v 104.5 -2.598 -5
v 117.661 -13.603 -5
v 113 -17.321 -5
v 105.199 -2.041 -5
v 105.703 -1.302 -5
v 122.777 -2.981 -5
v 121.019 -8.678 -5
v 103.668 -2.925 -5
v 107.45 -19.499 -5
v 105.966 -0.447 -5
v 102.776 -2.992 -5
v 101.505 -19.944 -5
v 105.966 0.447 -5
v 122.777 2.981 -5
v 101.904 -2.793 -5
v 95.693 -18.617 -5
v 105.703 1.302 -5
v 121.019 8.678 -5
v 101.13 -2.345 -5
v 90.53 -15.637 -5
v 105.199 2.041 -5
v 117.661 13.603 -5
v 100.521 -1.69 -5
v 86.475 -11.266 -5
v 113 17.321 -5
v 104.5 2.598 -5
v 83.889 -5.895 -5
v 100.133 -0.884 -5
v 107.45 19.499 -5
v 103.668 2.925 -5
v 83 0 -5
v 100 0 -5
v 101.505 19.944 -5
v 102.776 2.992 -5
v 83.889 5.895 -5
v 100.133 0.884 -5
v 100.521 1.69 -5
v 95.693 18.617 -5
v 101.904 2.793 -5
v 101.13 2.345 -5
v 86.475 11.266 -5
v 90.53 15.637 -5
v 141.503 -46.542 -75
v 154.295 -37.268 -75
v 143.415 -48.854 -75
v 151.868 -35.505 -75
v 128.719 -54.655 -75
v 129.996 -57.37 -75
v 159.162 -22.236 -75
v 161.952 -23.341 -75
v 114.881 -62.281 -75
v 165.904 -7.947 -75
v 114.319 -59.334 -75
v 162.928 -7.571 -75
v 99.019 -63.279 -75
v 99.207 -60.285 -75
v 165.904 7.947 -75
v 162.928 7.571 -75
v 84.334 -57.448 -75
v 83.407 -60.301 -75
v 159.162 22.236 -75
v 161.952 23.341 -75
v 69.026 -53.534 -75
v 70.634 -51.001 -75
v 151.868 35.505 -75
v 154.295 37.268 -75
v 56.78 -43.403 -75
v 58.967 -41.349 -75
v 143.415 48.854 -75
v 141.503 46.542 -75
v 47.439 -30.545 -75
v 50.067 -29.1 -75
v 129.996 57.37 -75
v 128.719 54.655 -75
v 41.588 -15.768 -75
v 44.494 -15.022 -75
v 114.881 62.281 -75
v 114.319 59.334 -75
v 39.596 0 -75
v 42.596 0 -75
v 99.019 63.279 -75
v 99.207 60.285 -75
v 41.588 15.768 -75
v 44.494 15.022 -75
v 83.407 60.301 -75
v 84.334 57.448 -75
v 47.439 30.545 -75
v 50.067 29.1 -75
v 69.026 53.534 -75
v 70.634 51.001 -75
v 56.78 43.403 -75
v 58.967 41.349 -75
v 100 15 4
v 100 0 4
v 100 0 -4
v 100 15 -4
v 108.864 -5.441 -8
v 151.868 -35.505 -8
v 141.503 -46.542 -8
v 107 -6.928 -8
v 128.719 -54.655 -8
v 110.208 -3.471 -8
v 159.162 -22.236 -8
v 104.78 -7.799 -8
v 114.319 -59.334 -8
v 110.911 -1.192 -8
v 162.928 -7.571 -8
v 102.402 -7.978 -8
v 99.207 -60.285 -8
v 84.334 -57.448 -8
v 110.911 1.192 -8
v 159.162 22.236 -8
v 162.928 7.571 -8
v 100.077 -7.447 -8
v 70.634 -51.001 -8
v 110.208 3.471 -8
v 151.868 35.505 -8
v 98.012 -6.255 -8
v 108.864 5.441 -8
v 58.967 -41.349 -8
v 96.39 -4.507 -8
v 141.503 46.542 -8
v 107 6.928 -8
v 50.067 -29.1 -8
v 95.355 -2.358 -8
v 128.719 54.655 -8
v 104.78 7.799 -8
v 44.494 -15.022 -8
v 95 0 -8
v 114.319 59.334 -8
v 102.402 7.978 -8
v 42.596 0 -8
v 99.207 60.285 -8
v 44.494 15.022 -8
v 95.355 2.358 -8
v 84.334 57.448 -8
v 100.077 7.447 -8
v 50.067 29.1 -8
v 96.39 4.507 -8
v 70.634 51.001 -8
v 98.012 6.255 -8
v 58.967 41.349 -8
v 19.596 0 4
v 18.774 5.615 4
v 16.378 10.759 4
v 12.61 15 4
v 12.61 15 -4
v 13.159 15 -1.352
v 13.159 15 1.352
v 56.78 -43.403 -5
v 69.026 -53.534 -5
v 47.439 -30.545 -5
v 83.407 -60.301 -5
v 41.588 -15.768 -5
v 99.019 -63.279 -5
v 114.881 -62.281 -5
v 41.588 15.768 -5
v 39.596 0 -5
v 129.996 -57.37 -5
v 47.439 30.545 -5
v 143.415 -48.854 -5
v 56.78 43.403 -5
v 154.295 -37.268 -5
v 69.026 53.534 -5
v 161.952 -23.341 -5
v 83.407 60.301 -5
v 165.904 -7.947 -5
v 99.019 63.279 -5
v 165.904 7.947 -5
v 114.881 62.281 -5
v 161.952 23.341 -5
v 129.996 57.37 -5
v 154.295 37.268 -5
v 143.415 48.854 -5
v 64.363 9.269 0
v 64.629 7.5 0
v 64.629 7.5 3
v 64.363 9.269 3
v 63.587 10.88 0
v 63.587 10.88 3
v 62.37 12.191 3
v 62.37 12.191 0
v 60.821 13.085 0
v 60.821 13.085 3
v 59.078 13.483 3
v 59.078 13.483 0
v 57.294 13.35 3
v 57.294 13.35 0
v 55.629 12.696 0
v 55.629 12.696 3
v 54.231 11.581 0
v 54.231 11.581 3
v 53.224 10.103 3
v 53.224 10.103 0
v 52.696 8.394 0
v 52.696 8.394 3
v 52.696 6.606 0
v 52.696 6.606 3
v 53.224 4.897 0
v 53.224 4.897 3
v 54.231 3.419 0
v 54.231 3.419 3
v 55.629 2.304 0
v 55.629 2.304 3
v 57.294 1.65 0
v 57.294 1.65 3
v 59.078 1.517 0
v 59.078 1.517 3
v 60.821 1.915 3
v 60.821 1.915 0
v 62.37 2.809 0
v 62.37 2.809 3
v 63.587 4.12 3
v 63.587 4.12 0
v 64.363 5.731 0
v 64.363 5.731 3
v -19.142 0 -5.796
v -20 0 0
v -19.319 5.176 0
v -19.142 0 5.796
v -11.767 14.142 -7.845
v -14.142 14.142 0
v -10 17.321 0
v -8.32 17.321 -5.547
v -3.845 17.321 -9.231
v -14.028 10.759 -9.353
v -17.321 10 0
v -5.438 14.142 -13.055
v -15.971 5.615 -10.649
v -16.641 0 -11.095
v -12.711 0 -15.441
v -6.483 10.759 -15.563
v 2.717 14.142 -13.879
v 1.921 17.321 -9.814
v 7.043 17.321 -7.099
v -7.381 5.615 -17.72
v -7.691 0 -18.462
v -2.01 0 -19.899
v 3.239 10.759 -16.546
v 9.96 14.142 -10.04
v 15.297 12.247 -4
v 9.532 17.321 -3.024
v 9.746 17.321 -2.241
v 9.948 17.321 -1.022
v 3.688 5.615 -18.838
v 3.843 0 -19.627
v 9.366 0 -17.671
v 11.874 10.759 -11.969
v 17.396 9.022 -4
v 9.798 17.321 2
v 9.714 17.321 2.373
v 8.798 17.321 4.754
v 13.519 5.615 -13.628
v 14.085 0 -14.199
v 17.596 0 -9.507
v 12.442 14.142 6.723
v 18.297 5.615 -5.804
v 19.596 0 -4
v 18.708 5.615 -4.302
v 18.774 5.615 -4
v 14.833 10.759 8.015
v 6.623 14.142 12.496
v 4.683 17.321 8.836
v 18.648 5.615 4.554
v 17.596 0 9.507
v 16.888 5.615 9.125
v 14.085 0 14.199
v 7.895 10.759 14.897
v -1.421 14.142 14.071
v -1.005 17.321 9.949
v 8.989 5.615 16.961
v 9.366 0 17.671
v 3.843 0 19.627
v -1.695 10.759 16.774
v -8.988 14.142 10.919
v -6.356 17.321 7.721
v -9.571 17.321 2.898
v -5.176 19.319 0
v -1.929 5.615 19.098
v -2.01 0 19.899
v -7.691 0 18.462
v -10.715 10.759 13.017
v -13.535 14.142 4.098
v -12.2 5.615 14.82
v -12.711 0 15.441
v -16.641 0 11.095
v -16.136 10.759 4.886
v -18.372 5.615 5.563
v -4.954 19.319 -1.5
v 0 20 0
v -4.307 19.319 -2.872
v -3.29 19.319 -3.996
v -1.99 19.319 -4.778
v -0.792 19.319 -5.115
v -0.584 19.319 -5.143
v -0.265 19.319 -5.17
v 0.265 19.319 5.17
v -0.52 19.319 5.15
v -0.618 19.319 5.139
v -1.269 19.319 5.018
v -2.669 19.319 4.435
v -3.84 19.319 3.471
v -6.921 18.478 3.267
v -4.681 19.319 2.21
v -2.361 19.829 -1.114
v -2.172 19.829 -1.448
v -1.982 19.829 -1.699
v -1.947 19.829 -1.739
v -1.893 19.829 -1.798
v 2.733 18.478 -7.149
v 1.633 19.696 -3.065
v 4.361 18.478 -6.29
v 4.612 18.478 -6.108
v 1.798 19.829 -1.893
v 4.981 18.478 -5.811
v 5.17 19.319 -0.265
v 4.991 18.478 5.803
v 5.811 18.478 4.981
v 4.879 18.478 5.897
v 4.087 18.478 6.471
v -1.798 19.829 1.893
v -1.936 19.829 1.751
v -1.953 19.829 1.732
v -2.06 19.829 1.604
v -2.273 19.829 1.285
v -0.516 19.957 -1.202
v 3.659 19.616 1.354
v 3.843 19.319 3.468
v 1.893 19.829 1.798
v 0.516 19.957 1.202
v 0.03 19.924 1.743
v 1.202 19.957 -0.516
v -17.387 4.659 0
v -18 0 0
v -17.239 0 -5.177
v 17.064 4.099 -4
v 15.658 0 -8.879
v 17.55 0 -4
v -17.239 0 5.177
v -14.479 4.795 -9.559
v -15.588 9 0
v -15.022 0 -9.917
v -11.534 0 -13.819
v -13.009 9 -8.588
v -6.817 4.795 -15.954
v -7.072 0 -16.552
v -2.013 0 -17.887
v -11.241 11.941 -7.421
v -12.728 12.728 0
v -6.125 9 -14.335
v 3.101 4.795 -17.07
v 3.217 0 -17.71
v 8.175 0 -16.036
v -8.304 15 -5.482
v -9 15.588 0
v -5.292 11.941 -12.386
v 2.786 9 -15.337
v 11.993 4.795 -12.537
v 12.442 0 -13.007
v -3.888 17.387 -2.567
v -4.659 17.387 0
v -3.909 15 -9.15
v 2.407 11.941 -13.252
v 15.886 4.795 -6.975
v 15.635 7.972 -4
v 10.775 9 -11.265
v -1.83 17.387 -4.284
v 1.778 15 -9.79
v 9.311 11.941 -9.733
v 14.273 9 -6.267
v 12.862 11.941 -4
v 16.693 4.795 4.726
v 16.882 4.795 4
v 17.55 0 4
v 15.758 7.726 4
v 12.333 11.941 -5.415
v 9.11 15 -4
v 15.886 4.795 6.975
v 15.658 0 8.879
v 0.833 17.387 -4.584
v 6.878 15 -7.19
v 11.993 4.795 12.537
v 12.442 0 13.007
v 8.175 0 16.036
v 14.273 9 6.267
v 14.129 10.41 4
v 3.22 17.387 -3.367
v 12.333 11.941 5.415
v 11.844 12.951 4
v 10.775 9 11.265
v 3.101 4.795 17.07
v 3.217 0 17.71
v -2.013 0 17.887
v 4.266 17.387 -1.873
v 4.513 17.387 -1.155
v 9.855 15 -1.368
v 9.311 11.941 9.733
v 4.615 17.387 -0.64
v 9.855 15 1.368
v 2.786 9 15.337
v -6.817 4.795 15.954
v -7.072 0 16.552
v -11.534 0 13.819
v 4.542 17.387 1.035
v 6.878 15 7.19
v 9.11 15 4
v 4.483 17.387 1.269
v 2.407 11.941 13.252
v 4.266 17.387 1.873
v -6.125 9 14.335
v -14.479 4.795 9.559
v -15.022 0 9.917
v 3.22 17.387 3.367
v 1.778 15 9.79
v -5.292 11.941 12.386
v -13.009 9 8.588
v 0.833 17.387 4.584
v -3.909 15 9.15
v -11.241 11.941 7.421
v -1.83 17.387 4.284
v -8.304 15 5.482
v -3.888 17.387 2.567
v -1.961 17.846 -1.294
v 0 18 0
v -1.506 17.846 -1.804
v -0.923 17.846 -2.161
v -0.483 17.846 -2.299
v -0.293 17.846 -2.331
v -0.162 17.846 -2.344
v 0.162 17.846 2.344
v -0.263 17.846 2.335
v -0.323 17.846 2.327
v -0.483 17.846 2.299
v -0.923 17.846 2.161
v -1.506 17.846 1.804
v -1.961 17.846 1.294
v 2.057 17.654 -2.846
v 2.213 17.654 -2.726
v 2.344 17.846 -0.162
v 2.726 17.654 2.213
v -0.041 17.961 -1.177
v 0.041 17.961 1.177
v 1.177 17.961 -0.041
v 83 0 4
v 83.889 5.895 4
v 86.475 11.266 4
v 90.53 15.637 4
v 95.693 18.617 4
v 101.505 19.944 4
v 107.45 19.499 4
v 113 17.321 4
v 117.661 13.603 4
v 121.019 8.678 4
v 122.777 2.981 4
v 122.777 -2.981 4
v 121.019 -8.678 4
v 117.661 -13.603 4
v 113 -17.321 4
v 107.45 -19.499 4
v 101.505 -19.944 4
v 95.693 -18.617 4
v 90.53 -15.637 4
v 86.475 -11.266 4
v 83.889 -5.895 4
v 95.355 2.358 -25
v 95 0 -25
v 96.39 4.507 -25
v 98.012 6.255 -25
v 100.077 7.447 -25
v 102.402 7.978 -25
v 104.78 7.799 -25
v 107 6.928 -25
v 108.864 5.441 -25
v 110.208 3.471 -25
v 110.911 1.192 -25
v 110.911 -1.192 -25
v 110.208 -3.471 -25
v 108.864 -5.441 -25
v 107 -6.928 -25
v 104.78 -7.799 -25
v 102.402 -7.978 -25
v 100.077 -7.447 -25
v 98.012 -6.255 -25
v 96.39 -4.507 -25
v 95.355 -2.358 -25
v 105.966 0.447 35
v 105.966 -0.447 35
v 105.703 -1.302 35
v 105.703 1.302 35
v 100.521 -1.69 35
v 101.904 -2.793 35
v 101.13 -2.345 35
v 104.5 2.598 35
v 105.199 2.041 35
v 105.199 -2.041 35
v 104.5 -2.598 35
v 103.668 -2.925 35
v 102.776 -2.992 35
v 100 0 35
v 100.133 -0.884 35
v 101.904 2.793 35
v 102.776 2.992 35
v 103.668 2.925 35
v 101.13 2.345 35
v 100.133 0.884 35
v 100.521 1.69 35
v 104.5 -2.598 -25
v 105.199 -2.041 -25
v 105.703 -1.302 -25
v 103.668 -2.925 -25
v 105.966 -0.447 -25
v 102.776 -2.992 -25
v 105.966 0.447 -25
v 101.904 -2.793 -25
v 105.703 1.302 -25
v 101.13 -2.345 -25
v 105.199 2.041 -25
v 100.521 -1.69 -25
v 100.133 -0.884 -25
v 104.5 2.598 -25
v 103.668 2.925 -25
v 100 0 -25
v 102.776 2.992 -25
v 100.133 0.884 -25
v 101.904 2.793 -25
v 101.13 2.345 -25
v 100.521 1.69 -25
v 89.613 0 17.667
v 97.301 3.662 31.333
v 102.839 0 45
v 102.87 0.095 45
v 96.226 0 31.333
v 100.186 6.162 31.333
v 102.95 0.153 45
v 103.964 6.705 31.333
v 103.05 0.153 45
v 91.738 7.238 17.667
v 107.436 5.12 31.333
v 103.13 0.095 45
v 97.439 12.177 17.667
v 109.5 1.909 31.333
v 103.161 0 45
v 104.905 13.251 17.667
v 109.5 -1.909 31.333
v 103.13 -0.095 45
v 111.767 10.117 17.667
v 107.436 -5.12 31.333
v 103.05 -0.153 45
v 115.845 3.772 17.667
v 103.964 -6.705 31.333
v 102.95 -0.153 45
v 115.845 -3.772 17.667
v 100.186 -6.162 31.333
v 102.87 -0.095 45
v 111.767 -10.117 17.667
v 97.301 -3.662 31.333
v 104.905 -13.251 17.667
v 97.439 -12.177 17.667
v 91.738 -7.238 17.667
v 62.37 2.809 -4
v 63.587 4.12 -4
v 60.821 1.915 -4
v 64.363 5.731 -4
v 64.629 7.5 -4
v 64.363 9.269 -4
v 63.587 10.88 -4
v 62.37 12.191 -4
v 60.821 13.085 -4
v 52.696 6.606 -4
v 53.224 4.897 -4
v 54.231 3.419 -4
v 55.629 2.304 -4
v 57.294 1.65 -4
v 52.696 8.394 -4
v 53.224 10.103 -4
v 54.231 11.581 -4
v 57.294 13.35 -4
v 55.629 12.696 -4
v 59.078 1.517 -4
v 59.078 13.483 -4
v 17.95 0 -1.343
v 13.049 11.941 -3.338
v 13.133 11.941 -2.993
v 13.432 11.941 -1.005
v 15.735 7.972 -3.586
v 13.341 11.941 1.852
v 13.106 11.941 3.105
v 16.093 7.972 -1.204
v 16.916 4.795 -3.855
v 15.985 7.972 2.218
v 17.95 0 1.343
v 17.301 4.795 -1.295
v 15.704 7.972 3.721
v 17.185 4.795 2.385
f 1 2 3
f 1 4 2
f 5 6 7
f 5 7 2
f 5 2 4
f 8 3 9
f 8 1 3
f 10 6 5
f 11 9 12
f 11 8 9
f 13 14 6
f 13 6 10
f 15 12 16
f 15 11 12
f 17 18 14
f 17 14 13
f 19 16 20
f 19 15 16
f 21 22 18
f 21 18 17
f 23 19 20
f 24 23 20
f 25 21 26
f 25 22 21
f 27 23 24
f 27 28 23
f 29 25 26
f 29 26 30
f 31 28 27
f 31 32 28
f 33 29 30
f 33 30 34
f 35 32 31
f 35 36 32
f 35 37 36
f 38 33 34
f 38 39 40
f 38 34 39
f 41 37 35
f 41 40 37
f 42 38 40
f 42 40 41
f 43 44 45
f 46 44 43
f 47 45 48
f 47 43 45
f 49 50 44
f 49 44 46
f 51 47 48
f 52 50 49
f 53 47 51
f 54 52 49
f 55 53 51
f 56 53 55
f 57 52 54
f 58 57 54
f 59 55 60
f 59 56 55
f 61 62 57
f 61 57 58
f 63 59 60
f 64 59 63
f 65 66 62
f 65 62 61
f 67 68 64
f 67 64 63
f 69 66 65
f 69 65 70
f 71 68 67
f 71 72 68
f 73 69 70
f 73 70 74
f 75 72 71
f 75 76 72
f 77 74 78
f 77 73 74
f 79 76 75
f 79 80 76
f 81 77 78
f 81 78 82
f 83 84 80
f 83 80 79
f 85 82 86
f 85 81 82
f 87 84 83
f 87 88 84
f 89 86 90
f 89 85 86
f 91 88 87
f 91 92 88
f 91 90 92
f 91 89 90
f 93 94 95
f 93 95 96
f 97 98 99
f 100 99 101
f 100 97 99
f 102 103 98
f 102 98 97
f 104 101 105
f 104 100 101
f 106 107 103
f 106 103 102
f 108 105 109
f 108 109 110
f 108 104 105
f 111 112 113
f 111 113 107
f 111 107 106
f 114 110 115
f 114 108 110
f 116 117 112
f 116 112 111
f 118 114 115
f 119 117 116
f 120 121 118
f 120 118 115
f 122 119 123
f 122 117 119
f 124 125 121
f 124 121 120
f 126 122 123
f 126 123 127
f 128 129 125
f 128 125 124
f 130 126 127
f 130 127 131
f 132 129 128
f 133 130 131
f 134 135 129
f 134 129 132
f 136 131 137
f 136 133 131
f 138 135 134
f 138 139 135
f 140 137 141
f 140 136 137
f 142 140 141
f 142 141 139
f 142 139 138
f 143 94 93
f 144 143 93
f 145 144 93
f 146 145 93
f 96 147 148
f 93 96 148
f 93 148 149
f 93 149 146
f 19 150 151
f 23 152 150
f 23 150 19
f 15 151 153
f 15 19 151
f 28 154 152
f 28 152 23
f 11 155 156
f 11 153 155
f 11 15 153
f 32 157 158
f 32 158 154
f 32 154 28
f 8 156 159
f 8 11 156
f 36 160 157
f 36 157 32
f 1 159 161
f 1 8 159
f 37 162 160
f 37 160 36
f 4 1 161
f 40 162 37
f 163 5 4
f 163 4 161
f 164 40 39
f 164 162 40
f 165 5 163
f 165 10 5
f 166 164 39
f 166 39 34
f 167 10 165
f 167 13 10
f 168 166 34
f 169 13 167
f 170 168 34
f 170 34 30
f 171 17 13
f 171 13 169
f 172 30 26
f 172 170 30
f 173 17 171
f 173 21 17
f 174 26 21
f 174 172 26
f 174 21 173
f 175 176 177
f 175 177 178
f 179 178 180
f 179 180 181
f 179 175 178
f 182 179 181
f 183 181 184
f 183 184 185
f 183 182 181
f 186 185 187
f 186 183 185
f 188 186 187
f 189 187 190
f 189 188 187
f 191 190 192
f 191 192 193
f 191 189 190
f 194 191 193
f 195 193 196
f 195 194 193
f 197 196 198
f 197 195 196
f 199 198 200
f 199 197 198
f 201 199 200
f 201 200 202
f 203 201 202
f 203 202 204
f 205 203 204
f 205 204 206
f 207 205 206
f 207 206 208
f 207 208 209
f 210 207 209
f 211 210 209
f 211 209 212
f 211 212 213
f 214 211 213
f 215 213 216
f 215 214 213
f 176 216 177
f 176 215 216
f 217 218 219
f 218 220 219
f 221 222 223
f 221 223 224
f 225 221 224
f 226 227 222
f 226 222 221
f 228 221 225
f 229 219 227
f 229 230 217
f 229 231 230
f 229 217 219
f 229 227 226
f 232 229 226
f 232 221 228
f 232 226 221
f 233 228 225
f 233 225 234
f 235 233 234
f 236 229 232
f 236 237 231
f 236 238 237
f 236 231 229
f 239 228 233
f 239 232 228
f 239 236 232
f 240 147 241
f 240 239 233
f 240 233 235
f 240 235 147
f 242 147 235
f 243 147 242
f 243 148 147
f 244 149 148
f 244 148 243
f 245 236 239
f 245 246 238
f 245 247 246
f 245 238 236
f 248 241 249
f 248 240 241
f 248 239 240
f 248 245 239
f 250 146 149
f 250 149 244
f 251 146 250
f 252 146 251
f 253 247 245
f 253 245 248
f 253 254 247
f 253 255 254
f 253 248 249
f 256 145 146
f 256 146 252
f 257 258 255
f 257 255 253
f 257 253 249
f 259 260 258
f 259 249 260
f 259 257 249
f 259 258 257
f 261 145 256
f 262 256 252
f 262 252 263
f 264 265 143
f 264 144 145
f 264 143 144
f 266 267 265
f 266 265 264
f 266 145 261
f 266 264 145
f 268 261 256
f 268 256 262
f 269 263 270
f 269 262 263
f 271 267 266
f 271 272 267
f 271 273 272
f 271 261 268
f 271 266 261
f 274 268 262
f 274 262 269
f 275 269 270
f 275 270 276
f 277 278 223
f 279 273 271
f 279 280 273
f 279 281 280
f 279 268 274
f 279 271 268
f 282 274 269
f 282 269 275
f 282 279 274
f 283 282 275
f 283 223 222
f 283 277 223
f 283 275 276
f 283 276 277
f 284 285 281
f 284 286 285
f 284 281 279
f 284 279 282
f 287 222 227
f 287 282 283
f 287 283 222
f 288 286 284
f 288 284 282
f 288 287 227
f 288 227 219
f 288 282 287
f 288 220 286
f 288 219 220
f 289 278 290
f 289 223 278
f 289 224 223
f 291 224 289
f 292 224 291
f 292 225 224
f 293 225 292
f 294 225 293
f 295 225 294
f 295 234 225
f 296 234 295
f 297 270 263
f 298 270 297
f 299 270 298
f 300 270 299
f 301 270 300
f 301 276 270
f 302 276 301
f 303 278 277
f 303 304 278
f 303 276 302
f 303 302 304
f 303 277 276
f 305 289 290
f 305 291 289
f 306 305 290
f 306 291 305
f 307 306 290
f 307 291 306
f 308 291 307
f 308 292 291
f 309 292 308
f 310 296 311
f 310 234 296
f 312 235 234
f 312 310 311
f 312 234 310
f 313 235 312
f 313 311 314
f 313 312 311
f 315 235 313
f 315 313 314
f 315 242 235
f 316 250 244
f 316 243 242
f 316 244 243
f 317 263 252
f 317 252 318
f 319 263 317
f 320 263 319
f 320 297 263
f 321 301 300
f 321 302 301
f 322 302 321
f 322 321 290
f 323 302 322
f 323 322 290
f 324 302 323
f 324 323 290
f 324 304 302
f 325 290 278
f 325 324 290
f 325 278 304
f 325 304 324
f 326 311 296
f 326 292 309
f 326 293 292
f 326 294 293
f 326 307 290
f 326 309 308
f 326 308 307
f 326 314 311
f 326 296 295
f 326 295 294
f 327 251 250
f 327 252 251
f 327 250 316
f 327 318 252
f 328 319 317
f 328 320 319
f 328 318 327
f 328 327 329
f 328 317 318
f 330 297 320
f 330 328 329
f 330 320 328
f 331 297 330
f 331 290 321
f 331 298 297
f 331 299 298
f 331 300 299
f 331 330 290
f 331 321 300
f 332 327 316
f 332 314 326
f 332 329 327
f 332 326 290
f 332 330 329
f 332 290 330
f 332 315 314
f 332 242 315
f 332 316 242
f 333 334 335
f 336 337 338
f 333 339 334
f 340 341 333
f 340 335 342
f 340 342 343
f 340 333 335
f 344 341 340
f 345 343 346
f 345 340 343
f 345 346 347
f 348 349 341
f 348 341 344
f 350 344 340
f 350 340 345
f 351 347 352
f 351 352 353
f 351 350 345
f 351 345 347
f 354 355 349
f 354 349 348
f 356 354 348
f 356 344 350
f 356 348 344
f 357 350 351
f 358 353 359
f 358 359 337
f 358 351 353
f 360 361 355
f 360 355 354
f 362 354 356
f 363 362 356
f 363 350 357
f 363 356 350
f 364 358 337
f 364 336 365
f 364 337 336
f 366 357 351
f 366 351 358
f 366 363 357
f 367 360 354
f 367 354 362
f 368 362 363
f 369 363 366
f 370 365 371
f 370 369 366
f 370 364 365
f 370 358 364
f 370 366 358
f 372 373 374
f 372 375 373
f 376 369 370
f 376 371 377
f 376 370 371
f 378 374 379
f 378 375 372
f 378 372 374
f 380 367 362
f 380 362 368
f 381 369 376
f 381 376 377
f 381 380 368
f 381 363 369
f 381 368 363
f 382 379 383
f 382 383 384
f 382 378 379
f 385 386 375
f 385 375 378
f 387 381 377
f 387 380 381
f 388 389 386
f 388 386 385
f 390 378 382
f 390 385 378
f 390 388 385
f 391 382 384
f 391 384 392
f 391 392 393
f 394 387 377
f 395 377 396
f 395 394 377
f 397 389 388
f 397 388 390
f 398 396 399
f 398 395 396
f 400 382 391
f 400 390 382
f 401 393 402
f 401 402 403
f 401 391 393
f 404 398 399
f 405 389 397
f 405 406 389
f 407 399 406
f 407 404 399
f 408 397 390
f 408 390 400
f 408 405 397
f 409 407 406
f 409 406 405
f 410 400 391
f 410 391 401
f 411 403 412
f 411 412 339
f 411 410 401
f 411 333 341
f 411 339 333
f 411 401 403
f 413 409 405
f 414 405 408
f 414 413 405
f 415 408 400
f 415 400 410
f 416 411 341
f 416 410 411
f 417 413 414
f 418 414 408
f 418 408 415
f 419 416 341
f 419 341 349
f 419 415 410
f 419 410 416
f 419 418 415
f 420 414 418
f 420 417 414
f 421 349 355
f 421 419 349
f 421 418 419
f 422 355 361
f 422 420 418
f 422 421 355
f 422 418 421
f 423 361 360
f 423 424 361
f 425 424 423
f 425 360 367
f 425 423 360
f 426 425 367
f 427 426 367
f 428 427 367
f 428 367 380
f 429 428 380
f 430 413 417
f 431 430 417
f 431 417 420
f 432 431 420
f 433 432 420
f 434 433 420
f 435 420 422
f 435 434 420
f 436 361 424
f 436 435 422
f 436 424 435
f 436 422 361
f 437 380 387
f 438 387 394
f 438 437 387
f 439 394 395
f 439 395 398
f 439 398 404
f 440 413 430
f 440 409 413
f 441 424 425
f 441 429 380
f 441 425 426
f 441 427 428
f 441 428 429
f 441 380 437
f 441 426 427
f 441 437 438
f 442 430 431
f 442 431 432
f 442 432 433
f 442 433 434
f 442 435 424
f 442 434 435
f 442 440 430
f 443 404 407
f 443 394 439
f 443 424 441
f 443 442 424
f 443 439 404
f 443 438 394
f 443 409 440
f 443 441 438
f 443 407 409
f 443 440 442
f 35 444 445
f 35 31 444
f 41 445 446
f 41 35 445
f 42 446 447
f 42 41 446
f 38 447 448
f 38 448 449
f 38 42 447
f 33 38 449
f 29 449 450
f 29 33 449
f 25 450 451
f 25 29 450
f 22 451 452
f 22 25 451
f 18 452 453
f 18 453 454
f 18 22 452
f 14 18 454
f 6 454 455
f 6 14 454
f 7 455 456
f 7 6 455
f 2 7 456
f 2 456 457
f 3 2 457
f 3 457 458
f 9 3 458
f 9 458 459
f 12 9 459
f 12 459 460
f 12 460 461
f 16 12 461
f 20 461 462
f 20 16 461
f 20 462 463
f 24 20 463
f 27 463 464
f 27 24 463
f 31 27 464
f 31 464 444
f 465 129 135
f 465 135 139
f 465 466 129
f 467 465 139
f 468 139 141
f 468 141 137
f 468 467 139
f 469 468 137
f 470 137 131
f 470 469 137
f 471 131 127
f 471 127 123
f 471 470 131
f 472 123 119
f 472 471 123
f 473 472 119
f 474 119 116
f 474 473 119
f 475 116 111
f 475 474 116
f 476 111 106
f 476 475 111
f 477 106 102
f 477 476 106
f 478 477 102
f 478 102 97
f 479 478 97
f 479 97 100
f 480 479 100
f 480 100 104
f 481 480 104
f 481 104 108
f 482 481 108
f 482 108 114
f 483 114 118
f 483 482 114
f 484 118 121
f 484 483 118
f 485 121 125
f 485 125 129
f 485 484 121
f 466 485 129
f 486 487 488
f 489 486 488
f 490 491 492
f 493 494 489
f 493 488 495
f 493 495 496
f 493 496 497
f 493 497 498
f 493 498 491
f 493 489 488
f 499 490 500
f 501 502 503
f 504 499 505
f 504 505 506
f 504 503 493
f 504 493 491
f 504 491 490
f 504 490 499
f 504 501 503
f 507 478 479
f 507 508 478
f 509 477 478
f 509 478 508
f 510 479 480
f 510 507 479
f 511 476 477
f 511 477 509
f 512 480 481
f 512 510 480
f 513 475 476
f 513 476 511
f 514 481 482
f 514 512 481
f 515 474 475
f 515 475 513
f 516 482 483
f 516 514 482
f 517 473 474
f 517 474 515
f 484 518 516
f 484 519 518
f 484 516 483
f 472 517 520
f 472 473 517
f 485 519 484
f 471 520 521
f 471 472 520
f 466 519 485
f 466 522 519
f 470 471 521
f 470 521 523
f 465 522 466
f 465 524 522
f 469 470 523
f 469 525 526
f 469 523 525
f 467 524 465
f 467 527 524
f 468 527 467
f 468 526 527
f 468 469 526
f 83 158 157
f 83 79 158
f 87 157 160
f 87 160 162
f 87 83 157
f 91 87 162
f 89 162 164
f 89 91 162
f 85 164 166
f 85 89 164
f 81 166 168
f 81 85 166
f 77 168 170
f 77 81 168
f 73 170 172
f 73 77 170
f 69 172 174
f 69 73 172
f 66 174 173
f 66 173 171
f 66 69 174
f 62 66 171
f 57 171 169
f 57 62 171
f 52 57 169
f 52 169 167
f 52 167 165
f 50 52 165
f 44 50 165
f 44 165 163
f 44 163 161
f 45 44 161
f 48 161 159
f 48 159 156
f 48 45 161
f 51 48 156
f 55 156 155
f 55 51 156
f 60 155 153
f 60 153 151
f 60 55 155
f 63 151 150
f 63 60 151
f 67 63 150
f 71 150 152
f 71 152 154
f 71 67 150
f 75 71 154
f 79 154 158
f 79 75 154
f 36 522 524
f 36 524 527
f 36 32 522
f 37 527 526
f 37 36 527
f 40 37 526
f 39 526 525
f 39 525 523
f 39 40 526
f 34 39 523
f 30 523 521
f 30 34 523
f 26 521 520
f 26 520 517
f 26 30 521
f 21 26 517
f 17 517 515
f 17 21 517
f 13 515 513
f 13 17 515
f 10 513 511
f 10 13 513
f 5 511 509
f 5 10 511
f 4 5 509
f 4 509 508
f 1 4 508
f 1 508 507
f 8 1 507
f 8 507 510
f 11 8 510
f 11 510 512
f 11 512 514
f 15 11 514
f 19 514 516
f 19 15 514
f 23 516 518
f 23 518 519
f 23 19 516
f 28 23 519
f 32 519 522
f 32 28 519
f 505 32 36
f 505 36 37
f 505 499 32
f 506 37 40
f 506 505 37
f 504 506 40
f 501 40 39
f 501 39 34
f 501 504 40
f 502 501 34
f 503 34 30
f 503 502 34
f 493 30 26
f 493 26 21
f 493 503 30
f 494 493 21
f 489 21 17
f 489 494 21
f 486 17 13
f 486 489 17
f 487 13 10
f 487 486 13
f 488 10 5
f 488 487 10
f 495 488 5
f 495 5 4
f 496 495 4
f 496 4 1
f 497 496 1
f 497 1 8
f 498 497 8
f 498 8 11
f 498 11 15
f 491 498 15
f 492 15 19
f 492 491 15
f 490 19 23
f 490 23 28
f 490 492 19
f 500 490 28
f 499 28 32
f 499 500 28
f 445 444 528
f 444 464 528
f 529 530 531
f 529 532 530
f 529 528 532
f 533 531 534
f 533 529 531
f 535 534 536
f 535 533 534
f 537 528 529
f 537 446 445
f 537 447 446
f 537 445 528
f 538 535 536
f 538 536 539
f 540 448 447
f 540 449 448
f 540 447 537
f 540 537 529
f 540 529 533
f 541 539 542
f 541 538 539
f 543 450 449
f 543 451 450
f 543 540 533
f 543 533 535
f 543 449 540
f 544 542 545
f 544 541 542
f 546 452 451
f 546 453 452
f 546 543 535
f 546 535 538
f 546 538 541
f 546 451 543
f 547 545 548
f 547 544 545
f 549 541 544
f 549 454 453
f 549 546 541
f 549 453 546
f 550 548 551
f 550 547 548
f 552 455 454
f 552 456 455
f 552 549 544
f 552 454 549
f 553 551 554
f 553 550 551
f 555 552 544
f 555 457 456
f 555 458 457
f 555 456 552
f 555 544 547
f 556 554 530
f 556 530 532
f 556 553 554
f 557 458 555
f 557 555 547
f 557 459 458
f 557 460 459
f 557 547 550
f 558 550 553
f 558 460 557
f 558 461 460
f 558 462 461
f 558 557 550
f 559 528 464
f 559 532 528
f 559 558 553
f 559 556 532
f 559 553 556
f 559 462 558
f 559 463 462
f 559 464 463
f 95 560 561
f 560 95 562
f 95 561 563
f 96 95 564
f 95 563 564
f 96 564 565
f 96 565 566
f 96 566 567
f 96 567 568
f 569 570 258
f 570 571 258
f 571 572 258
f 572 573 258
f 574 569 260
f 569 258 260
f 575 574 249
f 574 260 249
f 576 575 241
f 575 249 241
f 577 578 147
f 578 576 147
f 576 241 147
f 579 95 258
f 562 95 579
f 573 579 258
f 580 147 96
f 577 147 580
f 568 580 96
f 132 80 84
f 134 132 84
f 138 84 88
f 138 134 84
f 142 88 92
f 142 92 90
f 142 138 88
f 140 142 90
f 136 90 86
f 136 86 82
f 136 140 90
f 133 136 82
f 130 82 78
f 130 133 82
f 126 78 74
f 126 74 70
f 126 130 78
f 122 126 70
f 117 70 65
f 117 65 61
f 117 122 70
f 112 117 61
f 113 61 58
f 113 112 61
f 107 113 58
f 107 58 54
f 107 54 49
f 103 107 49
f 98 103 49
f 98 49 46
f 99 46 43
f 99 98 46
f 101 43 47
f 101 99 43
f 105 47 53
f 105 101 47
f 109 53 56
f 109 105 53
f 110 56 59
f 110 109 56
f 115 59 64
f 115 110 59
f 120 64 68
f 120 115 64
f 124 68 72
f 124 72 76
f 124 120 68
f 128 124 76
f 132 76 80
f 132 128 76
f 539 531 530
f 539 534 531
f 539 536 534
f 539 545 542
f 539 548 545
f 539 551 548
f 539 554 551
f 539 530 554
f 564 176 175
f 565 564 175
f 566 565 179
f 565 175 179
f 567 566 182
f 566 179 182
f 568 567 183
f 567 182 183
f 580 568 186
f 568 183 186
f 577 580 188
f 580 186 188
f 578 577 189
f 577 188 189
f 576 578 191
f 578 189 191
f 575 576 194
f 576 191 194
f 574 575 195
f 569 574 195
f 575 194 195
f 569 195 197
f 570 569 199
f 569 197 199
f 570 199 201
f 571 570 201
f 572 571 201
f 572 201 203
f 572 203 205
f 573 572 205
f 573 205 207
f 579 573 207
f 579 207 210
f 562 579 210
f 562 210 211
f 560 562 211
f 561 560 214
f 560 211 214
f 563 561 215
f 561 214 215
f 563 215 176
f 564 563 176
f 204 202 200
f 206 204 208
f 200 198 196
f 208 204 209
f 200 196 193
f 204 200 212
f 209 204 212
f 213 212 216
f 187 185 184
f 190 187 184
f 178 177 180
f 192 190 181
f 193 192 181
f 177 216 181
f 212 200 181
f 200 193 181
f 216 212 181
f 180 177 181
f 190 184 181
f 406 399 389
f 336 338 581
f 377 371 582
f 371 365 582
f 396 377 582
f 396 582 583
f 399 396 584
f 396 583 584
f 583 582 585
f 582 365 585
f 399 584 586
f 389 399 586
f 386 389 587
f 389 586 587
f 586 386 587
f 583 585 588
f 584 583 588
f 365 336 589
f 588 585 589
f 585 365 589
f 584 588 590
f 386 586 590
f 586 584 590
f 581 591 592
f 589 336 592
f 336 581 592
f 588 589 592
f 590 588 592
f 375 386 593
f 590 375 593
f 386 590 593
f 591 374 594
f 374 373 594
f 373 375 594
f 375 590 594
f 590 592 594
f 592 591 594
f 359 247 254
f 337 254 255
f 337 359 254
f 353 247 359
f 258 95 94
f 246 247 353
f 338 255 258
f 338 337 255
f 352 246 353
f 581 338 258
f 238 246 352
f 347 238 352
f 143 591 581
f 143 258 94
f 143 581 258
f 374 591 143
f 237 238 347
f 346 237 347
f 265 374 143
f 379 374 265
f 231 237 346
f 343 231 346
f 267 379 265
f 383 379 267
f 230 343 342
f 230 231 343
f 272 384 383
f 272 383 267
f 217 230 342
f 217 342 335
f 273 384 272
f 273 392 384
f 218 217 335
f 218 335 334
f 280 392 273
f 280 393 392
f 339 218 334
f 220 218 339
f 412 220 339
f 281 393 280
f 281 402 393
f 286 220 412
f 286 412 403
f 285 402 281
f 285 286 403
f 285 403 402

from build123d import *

# Parameters (mm, degrees)
F2_W           = 15
F2_H           = 8
F3_DEPTH       = 100
F12_R          = 6
F13_DEPTH      = 3
F13_DEPTH_BACK = 4


with BuildPart() as f1:
    # F0 (on Top) → F1 (revolve)
    with BuildSketch(Plane.XY):
        with BuildLine():
            ThreePointArc((-18, 0), (-12.727922, 12.727922), (0, 18))
            Line((0, 18), (0, 20))
            ThreePointArc((0, 20), (-14.142136, 14.142136), (-20, 0))
            Line((-20, 0), (-18, 0))
        make_face()
    revolve(axis=Axis((0, 9, 0), (0, -1, 0)))

    # F2 (on Right) → F3 (join)
    with BuildSketch(Plane.YZ):
        with Locations((7.5, 0)):
            Rectangle(F2_W, F2_H)
    extrude(amount=F3_DEPTH)

    # F4 (on Top) → F5 (revolve, cut)
    with BuildSketch(Plane.XY):
        with BuildLine():
            ThreePointArc((0, 18), (-12.727922, 12.727922), (-18, 0))
            Line((-18, 0), (0, 0))
            Line((0, 0), (0, 18))
        make_face()
    revolve(axis=Axis((0, 9, 0), (0, -1, 0)), mode=Mode.SUBTRACT)

    # F12 (on Top) → F13 (cut, two sides)
    with BuildSketch(Plane.XY) as f13_sk:
        with Locations((58.629402, 7.5)):
            Circle(F12_R)
    extrude(amount=F13_DEPTH, mode=Mode.SUBTRACT)
    extrude(f13_sk.sketch, amount=-F13_DEPTH_BACK, mode=Mode.SUBTRACT)


with BuildPart() as f7:
    # F6 (on Front) → F7 (revolve)
    with BuildSketch(Plane.XZ):
        Polygon((103, 45), (102.83871, 45), (83, 4), (83, -5), (100, -5), (100, 35), (103, 35), align=None)
    revolve(axis=Axis((103, 0, 20.166667), (0, 0, -1)))


with BuildPart() as f9:
    # F8 (on Front) → F9 (revolve)
    with BuildSketch(Plane.XZ):
        Polygon((100, -25), (100, -5), (39.595918, -5), (39.595918, -75), (42.595918, -75), (42.595918, -8), (95, -8), (95, -25), align=None)
    revolve(axis=Axis((103, 0, 20.166667), (0, 0, -1)))


solid = Compound([f1.part, f7.part, f9.part])
